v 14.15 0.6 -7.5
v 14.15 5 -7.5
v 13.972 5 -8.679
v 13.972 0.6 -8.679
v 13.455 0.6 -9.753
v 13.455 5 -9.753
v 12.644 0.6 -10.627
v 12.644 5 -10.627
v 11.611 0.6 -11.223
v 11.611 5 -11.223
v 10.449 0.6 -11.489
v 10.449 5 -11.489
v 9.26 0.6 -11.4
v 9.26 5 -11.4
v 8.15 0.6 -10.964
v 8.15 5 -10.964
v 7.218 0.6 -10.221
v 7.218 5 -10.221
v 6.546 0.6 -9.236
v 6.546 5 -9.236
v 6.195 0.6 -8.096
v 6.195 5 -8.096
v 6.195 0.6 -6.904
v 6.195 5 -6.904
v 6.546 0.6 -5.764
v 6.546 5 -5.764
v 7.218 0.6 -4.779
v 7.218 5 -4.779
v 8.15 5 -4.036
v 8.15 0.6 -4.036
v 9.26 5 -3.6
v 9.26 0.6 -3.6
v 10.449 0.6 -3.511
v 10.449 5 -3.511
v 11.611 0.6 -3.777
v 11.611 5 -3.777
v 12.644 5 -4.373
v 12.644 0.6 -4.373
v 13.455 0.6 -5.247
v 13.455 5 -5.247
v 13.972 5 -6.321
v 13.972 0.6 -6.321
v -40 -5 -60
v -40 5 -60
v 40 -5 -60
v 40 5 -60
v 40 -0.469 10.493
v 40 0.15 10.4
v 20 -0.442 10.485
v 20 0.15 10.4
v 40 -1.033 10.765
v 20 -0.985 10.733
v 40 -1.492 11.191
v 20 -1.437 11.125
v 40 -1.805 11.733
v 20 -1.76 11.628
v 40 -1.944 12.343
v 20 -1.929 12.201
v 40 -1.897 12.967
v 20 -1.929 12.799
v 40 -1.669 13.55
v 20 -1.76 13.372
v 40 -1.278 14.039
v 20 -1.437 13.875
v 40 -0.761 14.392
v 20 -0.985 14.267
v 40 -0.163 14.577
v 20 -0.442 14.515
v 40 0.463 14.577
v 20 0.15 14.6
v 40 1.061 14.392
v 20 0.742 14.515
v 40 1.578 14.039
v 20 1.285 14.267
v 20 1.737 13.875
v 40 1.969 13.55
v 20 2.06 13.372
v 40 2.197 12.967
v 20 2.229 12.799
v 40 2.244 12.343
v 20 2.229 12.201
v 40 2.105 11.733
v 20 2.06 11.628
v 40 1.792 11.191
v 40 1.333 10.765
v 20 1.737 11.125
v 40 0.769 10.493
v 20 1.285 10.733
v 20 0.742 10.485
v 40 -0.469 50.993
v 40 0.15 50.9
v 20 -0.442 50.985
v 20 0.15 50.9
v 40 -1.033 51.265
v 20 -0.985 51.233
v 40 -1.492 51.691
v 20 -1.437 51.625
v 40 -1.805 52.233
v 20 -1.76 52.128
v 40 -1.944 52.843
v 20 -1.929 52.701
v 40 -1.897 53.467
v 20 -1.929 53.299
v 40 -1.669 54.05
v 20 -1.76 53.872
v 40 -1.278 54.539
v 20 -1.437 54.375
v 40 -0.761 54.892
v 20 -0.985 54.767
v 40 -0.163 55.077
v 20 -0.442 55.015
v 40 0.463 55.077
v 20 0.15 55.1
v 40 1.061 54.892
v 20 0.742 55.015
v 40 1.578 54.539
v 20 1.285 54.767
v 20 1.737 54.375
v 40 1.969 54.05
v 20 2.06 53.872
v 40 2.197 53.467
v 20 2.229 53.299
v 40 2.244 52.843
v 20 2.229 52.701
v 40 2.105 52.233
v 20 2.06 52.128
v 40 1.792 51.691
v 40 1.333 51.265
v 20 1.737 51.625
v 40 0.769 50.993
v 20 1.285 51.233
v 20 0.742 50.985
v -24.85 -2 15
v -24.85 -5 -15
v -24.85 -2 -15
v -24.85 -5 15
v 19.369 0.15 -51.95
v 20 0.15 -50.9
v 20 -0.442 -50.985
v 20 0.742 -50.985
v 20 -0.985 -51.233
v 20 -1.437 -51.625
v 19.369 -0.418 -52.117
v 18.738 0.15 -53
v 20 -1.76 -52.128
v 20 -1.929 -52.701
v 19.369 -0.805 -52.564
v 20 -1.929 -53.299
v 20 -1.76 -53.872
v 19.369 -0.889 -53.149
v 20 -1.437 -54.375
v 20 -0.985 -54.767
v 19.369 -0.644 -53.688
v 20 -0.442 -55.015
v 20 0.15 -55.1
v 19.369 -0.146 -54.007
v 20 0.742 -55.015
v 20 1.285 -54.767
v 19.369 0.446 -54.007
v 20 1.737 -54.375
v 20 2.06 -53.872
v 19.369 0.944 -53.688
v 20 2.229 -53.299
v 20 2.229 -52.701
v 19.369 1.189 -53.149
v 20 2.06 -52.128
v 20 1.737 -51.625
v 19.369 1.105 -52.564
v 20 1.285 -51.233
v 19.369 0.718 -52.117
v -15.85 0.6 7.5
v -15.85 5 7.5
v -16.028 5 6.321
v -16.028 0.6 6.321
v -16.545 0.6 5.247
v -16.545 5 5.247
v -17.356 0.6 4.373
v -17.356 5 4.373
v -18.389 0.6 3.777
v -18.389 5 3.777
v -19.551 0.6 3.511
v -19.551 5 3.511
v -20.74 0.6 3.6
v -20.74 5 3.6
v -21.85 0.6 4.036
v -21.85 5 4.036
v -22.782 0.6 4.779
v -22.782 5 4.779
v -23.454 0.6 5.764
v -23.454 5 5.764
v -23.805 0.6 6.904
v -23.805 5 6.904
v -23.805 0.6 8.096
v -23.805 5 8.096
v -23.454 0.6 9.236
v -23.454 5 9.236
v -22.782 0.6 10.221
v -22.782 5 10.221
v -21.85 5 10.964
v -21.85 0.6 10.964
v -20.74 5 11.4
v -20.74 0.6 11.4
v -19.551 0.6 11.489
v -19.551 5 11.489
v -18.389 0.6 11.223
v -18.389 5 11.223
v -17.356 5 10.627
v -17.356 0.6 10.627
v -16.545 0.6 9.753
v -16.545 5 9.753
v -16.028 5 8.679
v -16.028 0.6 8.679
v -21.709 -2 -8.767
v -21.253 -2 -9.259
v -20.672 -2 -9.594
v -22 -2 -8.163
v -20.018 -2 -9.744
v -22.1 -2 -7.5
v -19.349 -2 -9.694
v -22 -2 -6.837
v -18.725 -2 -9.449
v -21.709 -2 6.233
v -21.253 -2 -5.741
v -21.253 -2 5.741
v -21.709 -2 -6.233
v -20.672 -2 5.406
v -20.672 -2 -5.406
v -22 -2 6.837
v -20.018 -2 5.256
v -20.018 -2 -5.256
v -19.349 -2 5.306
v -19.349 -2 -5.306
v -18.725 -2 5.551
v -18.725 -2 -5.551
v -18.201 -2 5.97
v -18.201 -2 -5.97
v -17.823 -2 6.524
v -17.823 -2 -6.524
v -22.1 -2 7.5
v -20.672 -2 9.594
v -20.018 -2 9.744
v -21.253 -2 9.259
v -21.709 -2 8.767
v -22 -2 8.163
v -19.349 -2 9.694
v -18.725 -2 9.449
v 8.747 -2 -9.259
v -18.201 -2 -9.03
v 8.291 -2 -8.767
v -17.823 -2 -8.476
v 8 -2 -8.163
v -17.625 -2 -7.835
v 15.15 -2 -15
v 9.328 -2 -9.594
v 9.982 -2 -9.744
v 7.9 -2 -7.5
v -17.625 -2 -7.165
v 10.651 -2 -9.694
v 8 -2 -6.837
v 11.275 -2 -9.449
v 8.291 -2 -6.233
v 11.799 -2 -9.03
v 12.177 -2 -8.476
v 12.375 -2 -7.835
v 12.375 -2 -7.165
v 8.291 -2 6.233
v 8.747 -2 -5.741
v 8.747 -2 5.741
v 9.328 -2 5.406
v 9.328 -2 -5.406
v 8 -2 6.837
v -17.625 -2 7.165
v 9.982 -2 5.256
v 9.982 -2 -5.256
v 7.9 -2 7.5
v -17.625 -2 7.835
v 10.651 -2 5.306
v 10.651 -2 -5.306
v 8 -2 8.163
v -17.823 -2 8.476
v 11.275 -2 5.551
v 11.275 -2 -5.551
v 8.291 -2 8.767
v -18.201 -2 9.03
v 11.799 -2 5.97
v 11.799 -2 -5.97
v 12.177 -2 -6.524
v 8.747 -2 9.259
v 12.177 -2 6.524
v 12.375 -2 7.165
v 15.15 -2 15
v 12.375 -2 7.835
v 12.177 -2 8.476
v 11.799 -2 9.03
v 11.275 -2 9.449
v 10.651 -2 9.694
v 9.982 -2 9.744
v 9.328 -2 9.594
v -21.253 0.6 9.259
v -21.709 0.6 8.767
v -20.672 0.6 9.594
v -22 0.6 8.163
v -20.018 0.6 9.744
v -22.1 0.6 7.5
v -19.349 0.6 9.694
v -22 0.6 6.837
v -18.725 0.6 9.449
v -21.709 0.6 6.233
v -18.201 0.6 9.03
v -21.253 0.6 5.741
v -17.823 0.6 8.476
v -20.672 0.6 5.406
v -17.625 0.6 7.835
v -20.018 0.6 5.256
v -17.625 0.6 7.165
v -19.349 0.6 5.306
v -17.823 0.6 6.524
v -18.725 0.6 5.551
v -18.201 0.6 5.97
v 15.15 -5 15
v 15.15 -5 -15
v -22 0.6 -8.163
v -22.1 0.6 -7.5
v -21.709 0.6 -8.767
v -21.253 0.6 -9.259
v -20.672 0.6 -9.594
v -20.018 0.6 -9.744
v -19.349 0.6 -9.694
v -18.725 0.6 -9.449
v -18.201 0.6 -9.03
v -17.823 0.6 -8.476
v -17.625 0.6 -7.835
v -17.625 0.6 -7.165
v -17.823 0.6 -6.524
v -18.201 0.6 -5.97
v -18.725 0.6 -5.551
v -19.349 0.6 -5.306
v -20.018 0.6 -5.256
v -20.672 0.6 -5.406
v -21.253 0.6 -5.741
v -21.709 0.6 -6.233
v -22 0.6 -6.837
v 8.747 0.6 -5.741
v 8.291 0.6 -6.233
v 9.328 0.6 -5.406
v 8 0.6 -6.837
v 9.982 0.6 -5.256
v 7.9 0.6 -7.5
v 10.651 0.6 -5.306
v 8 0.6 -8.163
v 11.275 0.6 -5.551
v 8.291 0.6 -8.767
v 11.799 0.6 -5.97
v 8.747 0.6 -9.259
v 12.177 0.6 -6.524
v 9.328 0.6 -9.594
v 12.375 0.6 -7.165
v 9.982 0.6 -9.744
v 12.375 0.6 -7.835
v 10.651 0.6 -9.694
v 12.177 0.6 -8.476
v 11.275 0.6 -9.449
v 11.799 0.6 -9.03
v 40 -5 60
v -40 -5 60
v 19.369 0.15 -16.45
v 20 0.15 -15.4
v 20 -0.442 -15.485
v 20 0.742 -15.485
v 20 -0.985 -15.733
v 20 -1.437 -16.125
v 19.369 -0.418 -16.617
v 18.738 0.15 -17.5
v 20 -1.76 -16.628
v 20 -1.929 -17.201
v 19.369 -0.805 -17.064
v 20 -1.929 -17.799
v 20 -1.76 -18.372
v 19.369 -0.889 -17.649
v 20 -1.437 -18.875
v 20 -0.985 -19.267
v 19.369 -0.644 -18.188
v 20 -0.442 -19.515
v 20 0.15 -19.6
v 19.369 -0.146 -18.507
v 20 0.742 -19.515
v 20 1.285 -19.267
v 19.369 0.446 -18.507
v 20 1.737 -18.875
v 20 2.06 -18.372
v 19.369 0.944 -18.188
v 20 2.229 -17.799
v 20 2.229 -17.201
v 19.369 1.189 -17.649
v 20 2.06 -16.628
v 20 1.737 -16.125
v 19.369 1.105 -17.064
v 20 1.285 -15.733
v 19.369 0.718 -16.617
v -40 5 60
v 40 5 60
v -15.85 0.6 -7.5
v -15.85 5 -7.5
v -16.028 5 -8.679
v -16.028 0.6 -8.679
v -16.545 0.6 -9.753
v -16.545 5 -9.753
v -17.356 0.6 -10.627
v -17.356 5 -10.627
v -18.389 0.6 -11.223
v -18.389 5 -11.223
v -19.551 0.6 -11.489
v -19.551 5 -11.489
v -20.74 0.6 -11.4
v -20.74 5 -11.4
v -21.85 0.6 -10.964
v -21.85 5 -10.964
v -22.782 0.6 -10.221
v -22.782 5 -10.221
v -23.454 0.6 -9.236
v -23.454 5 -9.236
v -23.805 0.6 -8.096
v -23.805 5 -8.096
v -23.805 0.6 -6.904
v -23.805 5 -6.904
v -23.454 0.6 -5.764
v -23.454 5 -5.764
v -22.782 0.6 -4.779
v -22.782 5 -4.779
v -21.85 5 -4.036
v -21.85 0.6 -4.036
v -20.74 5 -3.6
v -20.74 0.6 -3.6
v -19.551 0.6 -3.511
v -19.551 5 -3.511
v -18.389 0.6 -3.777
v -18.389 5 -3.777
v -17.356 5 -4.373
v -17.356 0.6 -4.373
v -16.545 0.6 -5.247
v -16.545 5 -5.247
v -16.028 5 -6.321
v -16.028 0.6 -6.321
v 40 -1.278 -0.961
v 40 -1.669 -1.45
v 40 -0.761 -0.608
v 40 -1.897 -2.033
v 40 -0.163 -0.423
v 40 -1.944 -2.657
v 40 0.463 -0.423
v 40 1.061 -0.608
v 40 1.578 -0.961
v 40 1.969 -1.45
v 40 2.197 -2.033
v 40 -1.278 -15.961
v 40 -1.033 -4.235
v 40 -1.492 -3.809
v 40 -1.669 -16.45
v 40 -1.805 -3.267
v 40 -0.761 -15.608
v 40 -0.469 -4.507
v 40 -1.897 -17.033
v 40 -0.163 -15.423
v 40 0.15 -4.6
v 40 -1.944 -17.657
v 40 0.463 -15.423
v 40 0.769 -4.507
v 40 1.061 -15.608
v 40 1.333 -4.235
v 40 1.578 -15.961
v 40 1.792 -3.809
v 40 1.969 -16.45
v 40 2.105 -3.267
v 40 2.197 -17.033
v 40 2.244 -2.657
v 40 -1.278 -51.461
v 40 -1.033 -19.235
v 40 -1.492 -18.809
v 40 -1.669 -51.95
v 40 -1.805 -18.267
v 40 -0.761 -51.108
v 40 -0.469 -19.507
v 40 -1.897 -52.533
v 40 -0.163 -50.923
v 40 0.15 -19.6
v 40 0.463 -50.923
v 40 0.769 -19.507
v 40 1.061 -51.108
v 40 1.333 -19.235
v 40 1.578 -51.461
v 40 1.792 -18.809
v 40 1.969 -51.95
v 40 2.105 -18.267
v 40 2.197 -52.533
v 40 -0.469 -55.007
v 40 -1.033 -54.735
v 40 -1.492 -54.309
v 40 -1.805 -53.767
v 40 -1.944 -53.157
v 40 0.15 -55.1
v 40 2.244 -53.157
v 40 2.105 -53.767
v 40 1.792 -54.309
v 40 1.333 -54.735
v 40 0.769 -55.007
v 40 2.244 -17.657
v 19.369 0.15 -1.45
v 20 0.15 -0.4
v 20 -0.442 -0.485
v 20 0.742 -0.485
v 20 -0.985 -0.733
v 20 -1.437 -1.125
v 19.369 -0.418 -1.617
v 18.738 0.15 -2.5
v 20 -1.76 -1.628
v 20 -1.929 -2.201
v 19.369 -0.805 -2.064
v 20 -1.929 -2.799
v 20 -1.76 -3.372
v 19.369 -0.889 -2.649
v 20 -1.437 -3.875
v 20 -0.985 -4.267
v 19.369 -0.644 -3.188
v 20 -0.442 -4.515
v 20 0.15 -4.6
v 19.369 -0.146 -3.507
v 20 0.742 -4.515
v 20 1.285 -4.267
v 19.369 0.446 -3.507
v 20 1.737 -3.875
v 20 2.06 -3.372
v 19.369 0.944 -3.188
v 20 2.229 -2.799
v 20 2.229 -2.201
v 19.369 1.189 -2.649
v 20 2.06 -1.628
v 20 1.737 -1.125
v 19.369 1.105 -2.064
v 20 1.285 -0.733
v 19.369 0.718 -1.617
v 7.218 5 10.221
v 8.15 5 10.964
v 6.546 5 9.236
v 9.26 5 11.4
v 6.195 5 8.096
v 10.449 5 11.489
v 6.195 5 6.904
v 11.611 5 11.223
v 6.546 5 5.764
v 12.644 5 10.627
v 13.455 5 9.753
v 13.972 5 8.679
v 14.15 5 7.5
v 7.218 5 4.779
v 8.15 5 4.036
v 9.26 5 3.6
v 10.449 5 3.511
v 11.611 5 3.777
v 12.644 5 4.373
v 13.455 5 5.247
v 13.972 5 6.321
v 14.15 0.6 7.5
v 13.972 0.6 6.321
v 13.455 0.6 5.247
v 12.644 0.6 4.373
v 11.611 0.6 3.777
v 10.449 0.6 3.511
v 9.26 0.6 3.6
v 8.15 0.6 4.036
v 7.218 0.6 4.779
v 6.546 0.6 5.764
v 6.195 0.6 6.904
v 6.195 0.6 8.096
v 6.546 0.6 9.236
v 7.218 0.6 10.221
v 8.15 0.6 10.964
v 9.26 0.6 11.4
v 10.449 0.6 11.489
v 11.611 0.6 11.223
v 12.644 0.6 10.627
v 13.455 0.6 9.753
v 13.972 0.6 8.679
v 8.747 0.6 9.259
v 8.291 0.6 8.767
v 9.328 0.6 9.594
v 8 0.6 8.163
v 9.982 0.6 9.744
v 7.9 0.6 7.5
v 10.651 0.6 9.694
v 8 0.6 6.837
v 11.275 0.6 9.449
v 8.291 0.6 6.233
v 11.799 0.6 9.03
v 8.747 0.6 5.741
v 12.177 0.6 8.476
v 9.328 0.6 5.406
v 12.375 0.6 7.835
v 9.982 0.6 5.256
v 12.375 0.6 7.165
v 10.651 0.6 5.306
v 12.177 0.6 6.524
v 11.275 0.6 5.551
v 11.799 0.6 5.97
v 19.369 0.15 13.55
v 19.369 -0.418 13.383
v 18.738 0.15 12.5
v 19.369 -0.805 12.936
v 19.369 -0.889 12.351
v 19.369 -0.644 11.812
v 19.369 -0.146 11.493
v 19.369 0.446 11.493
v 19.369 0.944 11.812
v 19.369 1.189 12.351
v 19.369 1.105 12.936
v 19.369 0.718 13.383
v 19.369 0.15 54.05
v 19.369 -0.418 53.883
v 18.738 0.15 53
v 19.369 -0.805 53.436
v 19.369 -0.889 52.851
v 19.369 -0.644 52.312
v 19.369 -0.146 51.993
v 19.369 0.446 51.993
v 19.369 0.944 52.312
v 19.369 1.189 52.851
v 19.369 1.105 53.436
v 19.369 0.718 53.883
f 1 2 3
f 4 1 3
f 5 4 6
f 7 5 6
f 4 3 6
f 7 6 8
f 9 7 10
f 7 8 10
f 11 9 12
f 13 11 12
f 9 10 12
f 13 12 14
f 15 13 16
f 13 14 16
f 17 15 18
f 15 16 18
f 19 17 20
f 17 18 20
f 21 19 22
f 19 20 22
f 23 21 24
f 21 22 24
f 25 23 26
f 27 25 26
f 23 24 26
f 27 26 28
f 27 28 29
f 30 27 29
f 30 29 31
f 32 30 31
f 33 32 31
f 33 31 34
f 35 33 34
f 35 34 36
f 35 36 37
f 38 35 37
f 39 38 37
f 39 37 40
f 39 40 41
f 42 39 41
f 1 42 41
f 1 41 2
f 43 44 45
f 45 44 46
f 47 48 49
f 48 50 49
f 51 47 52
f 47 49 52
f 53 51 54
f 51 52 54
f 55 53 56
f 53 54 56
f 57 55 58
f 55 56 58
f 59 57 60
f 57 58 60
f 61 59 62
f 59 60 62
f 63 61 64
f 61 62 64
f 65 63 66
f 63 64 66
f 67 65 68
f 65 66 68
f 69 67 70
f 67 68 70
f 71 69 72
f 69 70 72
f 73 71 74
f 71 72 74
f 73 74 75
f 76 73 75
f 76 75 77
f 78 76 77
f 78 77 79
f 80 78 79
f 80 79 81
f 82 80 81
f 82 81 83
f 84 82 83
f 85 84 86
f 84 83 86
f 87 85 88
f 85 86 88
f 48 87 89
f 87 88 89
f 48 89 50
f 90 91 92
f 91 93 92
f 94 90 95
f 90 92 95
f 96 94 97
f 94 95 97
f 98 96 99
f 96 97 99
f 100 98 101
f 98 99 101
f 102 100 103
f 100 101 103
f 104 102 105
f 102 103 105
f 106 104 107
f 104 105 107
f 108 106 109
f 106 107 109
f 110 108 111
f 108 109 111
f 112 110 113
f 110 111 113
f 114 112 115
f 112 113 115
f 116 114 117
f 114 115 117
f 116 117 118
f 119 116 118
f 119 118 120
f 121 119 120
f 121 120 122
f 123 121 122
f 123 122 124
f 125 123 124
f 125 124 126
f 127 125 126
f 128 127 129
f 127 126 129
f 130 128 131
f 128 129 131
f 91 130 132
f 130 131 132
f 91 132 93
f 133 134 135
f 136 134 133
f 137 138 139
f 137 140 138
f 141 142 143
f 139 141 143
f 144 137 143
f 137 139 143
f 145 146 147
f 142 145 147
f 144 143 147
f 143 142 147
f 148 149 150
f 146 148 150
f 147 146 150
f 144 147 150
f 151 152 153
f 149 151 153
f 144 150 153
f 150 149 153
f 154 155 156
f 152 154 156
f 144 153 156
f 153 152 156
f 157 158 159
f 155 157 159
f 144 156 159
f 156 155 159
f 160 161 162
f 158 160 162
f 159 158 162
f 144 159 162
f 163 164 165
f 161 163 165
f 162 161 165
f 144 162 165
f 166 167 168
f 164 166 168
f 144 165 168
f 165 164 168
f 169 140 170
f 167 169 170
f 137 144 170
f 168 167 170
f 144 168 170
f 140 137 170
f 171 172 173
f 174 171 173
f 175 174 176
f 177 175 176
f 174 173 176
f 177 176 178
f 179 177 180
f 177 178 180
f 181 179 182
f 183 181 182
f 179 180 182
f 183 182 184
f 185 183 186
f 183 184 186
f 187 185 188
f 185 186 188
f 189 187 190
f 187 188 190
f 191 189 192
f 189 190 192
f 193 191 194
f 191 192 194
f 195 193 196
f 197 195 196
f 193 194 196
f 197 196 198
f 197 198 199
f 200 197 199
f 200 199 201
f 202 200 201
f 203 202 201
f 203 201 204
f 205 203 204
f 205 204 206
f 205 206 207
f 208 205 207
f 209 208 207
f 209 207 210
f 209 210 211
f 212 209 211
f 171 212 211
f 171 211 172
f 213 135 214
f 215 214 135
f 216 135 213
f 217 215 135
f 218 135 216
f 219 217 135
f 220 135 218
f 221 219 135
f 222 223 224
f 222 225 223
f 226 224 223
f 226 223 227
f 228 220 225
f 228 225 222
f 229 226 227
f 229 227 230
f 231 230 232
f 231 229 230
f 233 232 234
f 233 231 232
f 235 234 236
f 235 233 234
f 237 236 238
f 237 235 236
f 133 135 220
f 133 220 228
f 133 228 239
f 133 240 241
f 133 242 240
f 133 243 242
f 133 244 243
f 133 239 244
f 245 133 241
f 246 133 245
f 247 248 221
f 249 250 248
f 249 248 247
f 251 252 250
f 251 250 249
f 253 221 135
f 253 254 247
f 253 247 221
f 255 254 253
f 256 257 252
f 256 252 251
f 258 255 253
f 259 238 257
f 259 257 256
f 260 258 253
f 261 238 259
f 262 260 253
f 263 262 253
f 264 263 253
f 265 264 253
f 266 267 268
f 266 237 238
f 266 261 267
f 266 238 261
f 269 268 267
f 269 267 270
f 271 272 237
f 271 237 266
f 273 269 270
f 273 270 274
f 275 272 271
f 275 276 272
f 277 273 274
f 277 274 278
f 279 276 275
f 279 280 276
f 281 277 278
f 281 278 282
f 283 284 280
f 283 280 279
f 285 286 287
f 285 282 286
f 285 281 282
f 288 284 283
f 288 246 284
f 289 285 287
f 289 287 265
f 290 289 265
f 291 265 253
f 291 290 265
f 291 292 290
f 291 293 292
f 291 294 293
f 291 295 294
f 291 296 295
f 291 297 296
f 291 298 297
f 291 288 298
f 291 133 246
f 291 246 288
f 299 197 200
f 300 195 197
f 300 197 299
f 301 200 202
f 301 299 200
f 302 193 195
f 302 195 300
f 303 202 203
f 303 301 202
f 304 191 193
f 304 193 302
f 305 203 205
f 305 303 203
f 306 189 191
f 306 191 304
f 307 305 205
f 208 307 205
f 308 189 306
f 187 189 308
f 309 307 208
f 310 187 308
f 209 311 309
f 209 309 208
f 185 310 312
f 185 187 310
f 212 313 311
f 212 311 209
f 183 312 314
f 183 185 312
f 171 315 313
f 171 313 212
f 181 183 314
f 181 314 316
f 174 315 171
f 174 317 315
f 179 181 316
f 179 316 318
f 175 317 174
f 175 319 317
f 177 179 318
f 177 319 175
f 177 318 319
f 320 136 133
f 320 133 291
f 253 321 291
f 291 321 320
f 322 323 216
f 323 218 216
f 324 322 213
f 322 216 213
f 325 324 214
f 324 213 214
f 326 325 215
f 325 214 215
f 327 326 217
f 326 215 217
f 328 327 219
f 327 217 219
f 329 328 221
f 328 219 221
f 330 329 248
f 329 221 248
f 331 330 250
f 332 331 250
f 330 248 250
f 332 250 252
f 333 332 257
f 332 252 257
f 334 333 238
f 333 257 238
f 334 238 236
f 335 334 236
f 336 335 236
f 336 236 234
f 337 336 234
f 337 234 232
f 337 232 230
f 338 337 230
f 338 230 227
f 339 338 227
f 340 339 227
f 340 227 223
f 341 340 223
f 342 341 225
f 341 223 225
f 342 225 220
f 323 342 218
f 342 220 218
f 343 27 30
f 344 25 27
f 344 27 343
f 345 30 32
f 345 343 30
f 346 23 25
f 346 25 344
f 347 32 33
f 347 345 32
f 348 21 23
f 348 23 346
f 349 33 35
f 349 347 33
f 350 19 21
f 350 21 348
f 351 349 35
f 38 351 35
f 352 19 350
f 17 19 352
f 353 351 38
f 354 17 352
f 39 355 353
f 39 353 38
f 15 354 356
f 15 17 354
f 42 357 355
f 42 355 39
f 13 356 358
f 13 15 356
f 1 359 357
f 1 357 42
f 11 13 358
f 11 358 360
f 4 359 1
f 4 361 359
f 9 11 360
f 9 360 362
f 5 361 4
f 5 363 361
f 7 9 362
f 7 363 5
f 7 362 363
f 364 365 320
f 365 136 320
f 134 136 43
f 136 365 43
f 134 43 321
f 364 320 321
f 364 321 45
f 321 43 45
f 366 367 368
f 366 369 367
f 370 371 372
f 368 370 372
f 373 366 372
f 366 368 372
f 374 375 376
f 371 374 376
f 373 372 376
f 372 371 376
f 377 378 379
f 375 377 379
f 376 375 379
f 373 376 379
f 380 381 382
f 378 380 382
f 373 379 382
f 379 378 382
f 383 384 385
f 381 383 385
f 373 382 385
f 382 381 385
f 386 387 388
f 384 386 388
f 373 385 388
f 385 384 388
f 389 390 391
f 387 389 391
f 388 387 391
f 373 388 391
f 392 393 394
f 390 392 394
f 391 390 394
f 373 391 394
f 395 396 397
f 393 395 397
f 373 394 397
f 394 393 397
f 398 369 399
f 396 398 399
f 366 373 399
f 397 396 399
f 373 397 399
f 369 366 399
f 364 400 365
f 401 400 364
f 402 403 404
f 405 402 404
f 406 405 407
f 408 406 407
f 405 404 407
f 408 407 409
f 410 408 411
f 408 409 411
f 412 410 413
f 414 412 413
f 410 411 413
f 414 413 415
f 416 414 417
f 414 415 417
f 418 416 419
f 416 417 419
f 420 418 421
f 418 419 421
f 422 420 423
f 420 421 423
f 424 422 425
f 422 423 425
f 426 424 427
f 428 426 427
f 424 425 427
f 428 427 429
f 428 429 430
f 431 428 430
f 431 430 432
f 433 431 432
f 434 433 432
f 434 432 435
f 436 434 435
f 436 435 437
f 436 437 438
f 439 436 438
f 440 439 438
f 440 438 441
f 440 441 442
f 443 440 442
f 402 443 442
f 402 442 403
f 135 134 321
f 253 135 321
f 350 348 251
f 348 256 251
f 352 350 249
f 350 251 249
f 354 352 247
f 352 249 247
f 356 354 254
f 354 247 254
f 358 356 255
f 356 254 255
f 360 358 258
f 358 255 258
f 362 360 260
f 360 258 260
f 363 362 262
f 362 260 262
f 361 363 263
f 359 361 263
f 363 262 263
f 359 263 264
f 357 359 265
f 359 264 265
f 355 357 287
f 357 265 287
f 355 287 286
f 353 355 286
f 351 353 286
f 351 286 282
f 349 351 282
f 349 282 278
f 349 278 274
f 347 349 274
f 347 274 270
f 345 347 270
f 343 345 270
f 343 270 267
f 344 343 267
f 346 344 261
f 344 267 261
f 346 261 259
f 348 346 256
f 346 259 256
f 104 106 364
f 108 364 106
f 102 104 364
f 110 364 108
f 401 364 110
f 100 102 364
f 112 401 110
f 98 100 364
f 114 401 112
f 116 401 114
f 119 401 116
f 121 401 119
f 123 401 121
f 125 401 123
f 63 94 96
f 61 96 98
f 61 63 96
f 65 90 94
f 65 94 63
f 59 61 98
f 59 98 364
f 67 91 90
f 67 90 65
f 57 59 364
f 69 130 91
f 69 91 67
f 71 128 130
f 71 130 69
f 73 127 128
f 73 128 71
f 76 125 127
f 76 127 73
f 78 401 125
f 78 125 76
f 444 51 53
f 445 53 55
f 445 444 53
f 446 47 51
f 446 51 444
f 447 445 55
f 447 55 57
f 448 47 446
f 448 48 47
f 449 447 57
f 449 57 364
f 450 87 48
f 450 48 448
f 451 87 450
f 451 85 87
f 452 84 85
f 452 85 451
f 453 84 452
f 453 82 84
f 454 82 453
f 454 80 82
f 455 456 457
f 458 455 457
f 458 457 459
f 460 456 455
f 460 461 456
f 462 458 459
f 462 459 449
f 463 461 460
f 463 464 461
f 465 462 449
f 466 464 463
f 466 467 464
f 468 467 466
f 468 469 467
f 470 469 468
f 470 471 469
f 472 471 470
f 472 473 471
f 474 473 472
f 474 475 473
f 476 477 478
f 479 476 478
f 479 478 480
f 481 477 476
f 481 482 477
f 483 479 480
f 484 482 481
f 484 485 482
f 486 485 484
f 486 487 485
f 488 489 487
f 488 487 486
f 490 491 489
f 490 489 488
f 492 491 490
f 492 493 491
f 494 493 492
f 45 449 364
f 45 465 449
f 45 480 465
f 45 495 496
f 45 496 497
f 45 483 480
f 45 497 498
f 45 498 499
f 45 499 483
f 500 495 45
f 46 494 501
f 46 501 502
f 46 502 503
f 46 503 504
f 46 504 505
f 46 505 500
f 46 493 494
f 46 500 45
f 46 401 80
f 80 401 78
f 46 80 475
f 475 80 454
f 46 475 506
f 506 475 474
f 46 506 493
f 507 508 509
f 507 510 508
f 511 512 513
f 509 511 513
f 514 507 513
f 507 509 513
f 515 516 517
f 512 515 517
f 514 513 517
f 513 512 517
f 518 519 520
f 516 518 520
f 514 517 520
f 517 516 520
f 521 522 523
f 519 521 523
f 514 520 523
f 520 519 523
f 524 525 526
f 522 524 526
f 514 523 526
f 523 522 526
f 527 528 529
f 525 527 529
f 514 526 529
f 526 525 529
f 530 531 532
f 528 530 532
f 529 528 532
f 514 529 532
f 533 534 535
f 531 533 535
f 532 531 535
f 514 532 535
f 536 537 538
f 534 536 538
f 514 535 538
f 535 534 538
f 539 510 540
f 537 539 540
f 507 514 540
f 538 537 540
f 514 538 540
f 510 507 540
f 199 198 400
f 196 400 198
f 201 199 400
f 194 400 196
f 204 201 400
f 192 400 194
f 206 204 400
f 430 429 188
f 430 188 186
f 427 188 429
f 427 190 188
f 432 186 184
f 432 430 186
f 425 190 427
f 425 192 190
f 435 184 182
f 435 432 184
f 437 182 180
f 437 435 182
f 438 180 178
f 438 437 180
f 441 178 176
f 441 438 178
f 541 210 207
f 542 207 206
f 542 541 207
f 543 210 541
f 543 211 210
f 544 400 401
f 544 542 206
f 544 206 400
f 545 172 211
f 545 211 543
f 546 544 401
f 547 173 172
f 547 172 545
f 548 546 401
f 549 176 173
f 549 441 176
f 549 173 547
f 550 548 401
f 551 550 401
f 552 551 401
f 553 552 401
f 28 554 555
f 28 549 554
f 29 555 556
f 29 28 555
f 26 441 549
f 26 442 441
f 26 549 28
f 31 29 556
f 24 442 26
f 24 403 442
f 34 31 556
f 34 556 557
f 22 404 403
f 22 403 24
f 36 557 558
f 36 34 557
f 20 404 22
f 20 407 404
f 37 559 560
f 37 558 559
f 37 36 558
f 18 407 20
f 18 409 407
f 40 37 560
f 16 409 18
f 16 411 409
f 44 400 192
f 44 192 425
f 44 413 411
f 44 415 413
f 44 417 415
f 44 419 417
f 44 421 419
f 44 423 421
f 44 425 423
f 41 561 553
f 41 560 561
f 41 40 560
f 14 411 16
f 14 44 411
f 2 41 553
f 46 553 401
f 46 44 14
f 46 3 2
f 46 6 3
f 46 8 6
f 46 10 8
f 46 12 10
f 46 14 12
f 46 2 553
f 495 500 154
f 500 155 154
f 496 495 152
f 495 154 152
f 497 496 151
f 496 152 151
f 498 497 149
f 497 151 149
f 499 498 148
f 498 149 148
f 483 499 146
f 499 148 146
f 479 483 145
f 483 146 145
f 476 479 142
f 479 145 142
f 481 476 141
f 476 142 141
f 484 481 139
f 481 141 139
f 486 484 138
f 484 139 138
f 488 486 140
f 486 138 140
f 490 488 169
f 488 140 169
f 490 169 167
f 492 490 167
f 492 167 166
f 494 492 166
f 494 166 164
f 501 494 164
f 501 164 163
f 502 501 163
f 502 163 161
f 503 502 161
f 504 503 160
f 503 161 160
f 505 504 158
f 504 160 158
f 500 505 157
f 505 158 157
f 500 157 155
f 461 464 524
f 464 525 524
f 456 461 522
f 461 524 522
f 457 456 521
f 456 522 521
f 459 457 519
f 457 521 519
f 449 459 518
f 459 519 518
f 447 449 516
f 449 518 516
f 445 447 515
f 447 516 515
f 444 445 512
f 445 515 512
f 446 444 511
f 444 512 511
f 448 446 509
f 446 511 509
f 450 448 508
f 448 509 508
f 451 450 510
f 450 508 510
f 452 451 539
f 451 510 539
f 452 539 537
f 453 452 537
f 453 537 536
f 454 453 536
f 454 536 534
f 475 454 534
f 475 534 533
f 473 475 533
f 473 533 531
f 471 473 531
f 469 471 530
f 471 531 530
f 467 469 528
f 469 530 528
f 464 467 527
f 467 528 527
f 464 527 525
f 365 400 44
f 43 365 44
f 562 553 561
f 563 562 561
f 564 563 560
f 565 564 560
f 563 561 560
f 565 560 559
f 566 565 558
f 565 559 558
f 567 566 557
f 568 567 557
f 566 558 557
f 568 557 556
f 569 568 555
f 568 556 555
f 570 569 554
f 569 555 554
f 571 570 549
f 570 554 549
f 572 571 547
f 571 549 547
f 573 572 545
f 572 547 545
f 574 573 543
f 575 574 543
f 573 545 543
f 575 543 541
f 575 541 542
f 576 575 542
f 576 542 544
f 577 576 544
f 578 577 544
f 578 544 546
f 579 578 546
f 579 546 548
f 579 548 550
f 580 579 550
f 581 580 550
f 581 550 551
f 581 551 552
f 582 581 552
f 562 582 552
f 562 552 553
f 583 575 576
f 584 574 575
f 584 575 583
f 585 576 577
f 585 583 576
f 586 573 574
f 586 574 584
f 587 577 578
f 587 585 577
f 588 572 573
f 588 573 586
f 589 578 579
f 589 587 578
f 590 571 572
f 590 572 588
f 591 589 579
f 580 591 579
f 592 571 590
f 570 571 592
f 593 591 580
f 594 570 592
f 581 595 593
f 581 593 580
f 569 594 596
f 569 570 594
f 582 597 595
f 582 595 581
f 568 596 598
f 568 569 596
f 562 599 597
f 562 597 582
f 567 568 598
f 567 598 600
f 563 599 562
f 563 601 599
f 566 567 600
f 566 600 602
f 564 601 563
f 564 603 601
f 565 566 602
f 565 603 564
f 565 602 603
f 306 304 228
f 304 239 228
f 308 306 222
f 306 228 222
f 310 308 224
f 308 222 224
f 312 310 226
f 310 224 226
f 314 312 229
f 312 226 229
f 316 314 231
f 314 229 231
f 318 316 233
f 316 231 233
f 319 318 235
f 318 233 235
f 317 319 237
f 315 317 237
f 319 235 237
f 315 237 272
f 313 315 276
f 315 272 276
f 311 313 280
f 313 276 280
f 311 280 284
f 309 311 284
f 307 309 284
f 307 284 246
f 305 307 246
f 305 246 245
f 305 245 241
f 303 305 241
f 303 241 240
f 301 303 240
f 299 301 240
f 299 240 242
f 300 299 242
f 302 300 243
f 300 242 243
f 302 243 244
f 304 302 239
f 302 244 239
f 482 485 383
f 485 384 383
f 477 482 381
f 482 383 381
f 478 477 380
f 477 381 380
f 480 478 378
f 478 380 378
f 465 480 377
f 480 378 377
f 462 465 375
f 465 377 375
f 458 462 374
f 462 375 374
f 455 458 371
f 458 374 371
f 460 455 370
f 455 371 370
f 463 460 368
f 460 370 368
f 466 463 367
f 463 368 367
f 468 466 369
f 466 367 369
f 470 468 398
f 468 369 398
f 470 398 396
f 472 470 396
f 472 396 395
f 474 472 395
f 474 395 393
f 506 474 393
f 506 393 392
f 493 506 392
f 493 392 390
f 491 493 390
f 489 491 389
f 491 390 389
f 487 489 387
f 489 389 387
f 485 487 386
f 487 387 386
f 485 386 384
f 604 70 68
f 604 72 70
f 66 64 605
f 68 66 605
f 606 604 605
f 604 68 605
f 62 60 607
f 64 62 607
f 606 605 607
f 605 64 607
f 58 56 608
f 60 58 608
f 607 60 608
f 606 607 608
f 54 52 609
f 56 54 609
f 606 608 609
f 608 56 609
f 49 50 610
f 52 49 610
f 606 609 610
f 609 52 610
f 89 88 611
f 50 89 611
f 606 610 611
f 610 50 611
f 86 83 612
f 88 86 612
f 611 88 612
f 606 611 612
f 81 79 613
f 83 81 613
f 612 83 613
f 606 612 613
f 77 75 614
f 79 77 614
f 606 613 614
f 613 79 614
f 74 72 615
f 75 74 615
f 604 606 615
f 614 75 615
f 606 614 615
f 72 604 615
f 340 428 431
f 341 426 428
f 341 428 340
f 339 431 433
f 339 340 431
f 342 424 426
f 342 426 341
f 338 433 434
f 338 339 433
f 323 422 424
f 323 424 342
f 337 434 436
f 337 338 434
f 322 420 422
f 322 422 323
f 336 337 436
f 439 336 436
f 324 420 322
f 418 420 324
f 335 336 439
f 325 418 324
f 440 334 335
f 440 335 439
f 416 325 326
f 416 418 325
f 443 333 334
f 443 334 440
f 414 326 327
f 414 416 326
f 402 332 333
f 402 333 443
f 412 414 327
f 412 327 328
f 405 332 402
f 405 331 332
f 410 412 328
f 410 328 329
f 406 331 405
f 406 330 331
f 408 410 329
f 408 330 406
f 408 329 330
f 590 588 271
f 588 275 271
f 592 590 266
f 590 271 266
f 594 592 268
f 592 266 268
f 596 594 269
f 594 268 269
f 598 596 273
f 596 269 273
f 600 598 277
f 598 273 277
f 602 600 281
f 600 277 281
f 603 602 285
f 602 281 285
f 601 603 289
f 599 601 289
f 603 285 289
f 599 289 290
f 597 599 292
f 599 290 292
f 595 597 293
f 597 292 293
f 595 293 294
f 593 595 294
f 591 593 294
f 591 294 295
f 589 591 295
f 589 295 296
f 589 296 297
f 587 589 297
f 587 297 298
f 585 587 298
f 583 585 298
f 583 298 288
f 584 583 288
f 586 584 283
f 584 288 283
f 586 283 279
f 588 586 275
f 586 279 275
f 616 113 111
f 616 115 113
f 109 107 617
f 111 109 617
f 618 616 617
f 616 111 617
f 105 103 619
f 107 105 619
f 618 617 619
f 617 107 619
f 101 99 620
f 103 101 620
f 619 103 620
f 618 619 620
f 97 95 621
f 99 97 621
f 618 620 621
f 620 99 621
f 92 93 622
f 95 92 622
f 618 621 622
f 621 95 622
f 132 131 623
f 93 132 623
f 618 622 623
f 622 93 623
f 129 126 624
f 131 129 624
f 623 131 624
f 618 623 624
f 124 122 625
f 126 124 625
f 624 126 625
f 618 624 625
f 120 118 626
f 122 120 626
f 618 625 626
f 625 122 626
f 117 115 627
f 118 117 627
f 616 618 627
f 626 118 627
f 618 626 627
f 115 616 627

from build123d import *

# Parameters (mm, degrees)
SKETCH1_W                                           = 80
SKETCH1_H                                           = 120
BOSS_EXTRUDE1_DEPTH                                 = 5
M5_TAPPED_HOLE1_D                                   = 4.2
M5_TAPPED_HOLE1_DEPTH                               = 20
M5_TAPPED_HOLE1_TIP                                 = 1.2618073
SKETCH6_W                                           = 40
SKETCH6_H                                           = 30
CUT_EXTRUDE2_DEPTH                                  = 3
CBORE_FOR_M4_HEX_SOCKET_HEAD_CAP_SCREW1_D           = 4.5
CBORE_FOR_M4_HEX_SOCKET_HEAD_CAP_SCREW1_DEPTH       = 20
CBORE_FOR_M4_HEX_SOCKET_HEAD_CAP_SCREW1_CBORE_D     = 8
CBORE_FOR_M4_HEX_SOCKET_HEAD_CAP_SCREW1_CBORE_DEPTH = 4.4
CBORE_FOR_M4_HEX_SOCKET_HEAD_CAP_SCREW1_TIP         = 1.351936393


with BuildPart() as part:
    # Sketch1 → Boss-Extrude1 (new, symmetric)
    with BuildSketch(Plane(origin=(0, 0, 0), x_dir=(1, 0, 0), z_dir=(0, 1, 0))):
        Rectangle(SKETCH1_W, SKETCH1_H)
    extrude(amount=BOSS_EXTRUDE1_DEPTH, both=True)

    # M5 Tapped Hole1
    with Locations(Plane(origin=(40, 0, 17.5), x_dir=(0, 0, 1), z_dir=(1, 0, 0))):
        with Locations((-70.5, -0.150021458), (-35, -0.150021458), (-20, -0.150021458), (-5, -0.150021458), (35.5, -0.150021458)):
            Hole(M5_TAPPED_HOLE1_D / 2, depth=M5_TAPPED_HOLE1_DEPTH)
            with Locations((0, 0, -(M5_TAPPED_HOLE1_DEPTH + M5_TAPPED_HOLE1_TIP / 2))):  # 118° drill point
                Cone(0, M5_TAPPED_HOLE1_D / 2, M5_TAPPED_HOLE1_TIP, mode=Mode.SUBTRACT)

    # Sketch6 → Cut-Extrude2 (cut)
    with BuildSketch(Plane.XZ.offset(5)):
        with Locations((-4.85, 0)):
            Rectangle(SKETCH6_W, SKETCH6_H)
    extrude(amount=-CUT_EXTRUDE2_DEPTH, mode=Mode.SUBTRACT)

    # CBORE for M4 Hex Socket Head Cap Screw1
    with Locations(Plane(origin=(0, 5, 0), x_dir=(1, 0, 0), z_dir=(0, 1, 0))):
        with Locations((-19.85000137, 7.5), (10.14999863, 7.5), (10.14999863, -7.5), (-19.85000137, -7.5)):
            CounterBoreHole(CBORE_FOR_M4_HEX_SOCKET_HEAD_CAP_SCREW1_D / 2, CBORE_FOR_M4_HEX_SOCKET_HEAD_CAP_SCREW1_CBORE_D / 2, CBORE_FOR_M4_HEX_SOCKET_HEAD_CAP_SCREW1_CBORE_DEPTH, depth=CBORE_FOR_M4_HEX_SOCKET_HEAD_CAP_SCREW1_DEPTH)
            with Locations((0, 0, -(CBORE_FOR_M4_HEX_SOCKET_HEAD_CAP_SCREW1_DEPTH + CBORE_FOR_M4_HEX_SOCKET_HEAD_CAP_SCREW1_TIP / 2))):  # 118° drill point
                Cone(0, CBORE_FOR_M4_HEX_SOCKET_HEAD_CAP_SCREW1_D / 2, CBORE_FOR_M4_HEX_SOCKET_HEAD_CAP_SCREW1_TIP, mode=Mode.SUBTRACT)


solid = part.part
